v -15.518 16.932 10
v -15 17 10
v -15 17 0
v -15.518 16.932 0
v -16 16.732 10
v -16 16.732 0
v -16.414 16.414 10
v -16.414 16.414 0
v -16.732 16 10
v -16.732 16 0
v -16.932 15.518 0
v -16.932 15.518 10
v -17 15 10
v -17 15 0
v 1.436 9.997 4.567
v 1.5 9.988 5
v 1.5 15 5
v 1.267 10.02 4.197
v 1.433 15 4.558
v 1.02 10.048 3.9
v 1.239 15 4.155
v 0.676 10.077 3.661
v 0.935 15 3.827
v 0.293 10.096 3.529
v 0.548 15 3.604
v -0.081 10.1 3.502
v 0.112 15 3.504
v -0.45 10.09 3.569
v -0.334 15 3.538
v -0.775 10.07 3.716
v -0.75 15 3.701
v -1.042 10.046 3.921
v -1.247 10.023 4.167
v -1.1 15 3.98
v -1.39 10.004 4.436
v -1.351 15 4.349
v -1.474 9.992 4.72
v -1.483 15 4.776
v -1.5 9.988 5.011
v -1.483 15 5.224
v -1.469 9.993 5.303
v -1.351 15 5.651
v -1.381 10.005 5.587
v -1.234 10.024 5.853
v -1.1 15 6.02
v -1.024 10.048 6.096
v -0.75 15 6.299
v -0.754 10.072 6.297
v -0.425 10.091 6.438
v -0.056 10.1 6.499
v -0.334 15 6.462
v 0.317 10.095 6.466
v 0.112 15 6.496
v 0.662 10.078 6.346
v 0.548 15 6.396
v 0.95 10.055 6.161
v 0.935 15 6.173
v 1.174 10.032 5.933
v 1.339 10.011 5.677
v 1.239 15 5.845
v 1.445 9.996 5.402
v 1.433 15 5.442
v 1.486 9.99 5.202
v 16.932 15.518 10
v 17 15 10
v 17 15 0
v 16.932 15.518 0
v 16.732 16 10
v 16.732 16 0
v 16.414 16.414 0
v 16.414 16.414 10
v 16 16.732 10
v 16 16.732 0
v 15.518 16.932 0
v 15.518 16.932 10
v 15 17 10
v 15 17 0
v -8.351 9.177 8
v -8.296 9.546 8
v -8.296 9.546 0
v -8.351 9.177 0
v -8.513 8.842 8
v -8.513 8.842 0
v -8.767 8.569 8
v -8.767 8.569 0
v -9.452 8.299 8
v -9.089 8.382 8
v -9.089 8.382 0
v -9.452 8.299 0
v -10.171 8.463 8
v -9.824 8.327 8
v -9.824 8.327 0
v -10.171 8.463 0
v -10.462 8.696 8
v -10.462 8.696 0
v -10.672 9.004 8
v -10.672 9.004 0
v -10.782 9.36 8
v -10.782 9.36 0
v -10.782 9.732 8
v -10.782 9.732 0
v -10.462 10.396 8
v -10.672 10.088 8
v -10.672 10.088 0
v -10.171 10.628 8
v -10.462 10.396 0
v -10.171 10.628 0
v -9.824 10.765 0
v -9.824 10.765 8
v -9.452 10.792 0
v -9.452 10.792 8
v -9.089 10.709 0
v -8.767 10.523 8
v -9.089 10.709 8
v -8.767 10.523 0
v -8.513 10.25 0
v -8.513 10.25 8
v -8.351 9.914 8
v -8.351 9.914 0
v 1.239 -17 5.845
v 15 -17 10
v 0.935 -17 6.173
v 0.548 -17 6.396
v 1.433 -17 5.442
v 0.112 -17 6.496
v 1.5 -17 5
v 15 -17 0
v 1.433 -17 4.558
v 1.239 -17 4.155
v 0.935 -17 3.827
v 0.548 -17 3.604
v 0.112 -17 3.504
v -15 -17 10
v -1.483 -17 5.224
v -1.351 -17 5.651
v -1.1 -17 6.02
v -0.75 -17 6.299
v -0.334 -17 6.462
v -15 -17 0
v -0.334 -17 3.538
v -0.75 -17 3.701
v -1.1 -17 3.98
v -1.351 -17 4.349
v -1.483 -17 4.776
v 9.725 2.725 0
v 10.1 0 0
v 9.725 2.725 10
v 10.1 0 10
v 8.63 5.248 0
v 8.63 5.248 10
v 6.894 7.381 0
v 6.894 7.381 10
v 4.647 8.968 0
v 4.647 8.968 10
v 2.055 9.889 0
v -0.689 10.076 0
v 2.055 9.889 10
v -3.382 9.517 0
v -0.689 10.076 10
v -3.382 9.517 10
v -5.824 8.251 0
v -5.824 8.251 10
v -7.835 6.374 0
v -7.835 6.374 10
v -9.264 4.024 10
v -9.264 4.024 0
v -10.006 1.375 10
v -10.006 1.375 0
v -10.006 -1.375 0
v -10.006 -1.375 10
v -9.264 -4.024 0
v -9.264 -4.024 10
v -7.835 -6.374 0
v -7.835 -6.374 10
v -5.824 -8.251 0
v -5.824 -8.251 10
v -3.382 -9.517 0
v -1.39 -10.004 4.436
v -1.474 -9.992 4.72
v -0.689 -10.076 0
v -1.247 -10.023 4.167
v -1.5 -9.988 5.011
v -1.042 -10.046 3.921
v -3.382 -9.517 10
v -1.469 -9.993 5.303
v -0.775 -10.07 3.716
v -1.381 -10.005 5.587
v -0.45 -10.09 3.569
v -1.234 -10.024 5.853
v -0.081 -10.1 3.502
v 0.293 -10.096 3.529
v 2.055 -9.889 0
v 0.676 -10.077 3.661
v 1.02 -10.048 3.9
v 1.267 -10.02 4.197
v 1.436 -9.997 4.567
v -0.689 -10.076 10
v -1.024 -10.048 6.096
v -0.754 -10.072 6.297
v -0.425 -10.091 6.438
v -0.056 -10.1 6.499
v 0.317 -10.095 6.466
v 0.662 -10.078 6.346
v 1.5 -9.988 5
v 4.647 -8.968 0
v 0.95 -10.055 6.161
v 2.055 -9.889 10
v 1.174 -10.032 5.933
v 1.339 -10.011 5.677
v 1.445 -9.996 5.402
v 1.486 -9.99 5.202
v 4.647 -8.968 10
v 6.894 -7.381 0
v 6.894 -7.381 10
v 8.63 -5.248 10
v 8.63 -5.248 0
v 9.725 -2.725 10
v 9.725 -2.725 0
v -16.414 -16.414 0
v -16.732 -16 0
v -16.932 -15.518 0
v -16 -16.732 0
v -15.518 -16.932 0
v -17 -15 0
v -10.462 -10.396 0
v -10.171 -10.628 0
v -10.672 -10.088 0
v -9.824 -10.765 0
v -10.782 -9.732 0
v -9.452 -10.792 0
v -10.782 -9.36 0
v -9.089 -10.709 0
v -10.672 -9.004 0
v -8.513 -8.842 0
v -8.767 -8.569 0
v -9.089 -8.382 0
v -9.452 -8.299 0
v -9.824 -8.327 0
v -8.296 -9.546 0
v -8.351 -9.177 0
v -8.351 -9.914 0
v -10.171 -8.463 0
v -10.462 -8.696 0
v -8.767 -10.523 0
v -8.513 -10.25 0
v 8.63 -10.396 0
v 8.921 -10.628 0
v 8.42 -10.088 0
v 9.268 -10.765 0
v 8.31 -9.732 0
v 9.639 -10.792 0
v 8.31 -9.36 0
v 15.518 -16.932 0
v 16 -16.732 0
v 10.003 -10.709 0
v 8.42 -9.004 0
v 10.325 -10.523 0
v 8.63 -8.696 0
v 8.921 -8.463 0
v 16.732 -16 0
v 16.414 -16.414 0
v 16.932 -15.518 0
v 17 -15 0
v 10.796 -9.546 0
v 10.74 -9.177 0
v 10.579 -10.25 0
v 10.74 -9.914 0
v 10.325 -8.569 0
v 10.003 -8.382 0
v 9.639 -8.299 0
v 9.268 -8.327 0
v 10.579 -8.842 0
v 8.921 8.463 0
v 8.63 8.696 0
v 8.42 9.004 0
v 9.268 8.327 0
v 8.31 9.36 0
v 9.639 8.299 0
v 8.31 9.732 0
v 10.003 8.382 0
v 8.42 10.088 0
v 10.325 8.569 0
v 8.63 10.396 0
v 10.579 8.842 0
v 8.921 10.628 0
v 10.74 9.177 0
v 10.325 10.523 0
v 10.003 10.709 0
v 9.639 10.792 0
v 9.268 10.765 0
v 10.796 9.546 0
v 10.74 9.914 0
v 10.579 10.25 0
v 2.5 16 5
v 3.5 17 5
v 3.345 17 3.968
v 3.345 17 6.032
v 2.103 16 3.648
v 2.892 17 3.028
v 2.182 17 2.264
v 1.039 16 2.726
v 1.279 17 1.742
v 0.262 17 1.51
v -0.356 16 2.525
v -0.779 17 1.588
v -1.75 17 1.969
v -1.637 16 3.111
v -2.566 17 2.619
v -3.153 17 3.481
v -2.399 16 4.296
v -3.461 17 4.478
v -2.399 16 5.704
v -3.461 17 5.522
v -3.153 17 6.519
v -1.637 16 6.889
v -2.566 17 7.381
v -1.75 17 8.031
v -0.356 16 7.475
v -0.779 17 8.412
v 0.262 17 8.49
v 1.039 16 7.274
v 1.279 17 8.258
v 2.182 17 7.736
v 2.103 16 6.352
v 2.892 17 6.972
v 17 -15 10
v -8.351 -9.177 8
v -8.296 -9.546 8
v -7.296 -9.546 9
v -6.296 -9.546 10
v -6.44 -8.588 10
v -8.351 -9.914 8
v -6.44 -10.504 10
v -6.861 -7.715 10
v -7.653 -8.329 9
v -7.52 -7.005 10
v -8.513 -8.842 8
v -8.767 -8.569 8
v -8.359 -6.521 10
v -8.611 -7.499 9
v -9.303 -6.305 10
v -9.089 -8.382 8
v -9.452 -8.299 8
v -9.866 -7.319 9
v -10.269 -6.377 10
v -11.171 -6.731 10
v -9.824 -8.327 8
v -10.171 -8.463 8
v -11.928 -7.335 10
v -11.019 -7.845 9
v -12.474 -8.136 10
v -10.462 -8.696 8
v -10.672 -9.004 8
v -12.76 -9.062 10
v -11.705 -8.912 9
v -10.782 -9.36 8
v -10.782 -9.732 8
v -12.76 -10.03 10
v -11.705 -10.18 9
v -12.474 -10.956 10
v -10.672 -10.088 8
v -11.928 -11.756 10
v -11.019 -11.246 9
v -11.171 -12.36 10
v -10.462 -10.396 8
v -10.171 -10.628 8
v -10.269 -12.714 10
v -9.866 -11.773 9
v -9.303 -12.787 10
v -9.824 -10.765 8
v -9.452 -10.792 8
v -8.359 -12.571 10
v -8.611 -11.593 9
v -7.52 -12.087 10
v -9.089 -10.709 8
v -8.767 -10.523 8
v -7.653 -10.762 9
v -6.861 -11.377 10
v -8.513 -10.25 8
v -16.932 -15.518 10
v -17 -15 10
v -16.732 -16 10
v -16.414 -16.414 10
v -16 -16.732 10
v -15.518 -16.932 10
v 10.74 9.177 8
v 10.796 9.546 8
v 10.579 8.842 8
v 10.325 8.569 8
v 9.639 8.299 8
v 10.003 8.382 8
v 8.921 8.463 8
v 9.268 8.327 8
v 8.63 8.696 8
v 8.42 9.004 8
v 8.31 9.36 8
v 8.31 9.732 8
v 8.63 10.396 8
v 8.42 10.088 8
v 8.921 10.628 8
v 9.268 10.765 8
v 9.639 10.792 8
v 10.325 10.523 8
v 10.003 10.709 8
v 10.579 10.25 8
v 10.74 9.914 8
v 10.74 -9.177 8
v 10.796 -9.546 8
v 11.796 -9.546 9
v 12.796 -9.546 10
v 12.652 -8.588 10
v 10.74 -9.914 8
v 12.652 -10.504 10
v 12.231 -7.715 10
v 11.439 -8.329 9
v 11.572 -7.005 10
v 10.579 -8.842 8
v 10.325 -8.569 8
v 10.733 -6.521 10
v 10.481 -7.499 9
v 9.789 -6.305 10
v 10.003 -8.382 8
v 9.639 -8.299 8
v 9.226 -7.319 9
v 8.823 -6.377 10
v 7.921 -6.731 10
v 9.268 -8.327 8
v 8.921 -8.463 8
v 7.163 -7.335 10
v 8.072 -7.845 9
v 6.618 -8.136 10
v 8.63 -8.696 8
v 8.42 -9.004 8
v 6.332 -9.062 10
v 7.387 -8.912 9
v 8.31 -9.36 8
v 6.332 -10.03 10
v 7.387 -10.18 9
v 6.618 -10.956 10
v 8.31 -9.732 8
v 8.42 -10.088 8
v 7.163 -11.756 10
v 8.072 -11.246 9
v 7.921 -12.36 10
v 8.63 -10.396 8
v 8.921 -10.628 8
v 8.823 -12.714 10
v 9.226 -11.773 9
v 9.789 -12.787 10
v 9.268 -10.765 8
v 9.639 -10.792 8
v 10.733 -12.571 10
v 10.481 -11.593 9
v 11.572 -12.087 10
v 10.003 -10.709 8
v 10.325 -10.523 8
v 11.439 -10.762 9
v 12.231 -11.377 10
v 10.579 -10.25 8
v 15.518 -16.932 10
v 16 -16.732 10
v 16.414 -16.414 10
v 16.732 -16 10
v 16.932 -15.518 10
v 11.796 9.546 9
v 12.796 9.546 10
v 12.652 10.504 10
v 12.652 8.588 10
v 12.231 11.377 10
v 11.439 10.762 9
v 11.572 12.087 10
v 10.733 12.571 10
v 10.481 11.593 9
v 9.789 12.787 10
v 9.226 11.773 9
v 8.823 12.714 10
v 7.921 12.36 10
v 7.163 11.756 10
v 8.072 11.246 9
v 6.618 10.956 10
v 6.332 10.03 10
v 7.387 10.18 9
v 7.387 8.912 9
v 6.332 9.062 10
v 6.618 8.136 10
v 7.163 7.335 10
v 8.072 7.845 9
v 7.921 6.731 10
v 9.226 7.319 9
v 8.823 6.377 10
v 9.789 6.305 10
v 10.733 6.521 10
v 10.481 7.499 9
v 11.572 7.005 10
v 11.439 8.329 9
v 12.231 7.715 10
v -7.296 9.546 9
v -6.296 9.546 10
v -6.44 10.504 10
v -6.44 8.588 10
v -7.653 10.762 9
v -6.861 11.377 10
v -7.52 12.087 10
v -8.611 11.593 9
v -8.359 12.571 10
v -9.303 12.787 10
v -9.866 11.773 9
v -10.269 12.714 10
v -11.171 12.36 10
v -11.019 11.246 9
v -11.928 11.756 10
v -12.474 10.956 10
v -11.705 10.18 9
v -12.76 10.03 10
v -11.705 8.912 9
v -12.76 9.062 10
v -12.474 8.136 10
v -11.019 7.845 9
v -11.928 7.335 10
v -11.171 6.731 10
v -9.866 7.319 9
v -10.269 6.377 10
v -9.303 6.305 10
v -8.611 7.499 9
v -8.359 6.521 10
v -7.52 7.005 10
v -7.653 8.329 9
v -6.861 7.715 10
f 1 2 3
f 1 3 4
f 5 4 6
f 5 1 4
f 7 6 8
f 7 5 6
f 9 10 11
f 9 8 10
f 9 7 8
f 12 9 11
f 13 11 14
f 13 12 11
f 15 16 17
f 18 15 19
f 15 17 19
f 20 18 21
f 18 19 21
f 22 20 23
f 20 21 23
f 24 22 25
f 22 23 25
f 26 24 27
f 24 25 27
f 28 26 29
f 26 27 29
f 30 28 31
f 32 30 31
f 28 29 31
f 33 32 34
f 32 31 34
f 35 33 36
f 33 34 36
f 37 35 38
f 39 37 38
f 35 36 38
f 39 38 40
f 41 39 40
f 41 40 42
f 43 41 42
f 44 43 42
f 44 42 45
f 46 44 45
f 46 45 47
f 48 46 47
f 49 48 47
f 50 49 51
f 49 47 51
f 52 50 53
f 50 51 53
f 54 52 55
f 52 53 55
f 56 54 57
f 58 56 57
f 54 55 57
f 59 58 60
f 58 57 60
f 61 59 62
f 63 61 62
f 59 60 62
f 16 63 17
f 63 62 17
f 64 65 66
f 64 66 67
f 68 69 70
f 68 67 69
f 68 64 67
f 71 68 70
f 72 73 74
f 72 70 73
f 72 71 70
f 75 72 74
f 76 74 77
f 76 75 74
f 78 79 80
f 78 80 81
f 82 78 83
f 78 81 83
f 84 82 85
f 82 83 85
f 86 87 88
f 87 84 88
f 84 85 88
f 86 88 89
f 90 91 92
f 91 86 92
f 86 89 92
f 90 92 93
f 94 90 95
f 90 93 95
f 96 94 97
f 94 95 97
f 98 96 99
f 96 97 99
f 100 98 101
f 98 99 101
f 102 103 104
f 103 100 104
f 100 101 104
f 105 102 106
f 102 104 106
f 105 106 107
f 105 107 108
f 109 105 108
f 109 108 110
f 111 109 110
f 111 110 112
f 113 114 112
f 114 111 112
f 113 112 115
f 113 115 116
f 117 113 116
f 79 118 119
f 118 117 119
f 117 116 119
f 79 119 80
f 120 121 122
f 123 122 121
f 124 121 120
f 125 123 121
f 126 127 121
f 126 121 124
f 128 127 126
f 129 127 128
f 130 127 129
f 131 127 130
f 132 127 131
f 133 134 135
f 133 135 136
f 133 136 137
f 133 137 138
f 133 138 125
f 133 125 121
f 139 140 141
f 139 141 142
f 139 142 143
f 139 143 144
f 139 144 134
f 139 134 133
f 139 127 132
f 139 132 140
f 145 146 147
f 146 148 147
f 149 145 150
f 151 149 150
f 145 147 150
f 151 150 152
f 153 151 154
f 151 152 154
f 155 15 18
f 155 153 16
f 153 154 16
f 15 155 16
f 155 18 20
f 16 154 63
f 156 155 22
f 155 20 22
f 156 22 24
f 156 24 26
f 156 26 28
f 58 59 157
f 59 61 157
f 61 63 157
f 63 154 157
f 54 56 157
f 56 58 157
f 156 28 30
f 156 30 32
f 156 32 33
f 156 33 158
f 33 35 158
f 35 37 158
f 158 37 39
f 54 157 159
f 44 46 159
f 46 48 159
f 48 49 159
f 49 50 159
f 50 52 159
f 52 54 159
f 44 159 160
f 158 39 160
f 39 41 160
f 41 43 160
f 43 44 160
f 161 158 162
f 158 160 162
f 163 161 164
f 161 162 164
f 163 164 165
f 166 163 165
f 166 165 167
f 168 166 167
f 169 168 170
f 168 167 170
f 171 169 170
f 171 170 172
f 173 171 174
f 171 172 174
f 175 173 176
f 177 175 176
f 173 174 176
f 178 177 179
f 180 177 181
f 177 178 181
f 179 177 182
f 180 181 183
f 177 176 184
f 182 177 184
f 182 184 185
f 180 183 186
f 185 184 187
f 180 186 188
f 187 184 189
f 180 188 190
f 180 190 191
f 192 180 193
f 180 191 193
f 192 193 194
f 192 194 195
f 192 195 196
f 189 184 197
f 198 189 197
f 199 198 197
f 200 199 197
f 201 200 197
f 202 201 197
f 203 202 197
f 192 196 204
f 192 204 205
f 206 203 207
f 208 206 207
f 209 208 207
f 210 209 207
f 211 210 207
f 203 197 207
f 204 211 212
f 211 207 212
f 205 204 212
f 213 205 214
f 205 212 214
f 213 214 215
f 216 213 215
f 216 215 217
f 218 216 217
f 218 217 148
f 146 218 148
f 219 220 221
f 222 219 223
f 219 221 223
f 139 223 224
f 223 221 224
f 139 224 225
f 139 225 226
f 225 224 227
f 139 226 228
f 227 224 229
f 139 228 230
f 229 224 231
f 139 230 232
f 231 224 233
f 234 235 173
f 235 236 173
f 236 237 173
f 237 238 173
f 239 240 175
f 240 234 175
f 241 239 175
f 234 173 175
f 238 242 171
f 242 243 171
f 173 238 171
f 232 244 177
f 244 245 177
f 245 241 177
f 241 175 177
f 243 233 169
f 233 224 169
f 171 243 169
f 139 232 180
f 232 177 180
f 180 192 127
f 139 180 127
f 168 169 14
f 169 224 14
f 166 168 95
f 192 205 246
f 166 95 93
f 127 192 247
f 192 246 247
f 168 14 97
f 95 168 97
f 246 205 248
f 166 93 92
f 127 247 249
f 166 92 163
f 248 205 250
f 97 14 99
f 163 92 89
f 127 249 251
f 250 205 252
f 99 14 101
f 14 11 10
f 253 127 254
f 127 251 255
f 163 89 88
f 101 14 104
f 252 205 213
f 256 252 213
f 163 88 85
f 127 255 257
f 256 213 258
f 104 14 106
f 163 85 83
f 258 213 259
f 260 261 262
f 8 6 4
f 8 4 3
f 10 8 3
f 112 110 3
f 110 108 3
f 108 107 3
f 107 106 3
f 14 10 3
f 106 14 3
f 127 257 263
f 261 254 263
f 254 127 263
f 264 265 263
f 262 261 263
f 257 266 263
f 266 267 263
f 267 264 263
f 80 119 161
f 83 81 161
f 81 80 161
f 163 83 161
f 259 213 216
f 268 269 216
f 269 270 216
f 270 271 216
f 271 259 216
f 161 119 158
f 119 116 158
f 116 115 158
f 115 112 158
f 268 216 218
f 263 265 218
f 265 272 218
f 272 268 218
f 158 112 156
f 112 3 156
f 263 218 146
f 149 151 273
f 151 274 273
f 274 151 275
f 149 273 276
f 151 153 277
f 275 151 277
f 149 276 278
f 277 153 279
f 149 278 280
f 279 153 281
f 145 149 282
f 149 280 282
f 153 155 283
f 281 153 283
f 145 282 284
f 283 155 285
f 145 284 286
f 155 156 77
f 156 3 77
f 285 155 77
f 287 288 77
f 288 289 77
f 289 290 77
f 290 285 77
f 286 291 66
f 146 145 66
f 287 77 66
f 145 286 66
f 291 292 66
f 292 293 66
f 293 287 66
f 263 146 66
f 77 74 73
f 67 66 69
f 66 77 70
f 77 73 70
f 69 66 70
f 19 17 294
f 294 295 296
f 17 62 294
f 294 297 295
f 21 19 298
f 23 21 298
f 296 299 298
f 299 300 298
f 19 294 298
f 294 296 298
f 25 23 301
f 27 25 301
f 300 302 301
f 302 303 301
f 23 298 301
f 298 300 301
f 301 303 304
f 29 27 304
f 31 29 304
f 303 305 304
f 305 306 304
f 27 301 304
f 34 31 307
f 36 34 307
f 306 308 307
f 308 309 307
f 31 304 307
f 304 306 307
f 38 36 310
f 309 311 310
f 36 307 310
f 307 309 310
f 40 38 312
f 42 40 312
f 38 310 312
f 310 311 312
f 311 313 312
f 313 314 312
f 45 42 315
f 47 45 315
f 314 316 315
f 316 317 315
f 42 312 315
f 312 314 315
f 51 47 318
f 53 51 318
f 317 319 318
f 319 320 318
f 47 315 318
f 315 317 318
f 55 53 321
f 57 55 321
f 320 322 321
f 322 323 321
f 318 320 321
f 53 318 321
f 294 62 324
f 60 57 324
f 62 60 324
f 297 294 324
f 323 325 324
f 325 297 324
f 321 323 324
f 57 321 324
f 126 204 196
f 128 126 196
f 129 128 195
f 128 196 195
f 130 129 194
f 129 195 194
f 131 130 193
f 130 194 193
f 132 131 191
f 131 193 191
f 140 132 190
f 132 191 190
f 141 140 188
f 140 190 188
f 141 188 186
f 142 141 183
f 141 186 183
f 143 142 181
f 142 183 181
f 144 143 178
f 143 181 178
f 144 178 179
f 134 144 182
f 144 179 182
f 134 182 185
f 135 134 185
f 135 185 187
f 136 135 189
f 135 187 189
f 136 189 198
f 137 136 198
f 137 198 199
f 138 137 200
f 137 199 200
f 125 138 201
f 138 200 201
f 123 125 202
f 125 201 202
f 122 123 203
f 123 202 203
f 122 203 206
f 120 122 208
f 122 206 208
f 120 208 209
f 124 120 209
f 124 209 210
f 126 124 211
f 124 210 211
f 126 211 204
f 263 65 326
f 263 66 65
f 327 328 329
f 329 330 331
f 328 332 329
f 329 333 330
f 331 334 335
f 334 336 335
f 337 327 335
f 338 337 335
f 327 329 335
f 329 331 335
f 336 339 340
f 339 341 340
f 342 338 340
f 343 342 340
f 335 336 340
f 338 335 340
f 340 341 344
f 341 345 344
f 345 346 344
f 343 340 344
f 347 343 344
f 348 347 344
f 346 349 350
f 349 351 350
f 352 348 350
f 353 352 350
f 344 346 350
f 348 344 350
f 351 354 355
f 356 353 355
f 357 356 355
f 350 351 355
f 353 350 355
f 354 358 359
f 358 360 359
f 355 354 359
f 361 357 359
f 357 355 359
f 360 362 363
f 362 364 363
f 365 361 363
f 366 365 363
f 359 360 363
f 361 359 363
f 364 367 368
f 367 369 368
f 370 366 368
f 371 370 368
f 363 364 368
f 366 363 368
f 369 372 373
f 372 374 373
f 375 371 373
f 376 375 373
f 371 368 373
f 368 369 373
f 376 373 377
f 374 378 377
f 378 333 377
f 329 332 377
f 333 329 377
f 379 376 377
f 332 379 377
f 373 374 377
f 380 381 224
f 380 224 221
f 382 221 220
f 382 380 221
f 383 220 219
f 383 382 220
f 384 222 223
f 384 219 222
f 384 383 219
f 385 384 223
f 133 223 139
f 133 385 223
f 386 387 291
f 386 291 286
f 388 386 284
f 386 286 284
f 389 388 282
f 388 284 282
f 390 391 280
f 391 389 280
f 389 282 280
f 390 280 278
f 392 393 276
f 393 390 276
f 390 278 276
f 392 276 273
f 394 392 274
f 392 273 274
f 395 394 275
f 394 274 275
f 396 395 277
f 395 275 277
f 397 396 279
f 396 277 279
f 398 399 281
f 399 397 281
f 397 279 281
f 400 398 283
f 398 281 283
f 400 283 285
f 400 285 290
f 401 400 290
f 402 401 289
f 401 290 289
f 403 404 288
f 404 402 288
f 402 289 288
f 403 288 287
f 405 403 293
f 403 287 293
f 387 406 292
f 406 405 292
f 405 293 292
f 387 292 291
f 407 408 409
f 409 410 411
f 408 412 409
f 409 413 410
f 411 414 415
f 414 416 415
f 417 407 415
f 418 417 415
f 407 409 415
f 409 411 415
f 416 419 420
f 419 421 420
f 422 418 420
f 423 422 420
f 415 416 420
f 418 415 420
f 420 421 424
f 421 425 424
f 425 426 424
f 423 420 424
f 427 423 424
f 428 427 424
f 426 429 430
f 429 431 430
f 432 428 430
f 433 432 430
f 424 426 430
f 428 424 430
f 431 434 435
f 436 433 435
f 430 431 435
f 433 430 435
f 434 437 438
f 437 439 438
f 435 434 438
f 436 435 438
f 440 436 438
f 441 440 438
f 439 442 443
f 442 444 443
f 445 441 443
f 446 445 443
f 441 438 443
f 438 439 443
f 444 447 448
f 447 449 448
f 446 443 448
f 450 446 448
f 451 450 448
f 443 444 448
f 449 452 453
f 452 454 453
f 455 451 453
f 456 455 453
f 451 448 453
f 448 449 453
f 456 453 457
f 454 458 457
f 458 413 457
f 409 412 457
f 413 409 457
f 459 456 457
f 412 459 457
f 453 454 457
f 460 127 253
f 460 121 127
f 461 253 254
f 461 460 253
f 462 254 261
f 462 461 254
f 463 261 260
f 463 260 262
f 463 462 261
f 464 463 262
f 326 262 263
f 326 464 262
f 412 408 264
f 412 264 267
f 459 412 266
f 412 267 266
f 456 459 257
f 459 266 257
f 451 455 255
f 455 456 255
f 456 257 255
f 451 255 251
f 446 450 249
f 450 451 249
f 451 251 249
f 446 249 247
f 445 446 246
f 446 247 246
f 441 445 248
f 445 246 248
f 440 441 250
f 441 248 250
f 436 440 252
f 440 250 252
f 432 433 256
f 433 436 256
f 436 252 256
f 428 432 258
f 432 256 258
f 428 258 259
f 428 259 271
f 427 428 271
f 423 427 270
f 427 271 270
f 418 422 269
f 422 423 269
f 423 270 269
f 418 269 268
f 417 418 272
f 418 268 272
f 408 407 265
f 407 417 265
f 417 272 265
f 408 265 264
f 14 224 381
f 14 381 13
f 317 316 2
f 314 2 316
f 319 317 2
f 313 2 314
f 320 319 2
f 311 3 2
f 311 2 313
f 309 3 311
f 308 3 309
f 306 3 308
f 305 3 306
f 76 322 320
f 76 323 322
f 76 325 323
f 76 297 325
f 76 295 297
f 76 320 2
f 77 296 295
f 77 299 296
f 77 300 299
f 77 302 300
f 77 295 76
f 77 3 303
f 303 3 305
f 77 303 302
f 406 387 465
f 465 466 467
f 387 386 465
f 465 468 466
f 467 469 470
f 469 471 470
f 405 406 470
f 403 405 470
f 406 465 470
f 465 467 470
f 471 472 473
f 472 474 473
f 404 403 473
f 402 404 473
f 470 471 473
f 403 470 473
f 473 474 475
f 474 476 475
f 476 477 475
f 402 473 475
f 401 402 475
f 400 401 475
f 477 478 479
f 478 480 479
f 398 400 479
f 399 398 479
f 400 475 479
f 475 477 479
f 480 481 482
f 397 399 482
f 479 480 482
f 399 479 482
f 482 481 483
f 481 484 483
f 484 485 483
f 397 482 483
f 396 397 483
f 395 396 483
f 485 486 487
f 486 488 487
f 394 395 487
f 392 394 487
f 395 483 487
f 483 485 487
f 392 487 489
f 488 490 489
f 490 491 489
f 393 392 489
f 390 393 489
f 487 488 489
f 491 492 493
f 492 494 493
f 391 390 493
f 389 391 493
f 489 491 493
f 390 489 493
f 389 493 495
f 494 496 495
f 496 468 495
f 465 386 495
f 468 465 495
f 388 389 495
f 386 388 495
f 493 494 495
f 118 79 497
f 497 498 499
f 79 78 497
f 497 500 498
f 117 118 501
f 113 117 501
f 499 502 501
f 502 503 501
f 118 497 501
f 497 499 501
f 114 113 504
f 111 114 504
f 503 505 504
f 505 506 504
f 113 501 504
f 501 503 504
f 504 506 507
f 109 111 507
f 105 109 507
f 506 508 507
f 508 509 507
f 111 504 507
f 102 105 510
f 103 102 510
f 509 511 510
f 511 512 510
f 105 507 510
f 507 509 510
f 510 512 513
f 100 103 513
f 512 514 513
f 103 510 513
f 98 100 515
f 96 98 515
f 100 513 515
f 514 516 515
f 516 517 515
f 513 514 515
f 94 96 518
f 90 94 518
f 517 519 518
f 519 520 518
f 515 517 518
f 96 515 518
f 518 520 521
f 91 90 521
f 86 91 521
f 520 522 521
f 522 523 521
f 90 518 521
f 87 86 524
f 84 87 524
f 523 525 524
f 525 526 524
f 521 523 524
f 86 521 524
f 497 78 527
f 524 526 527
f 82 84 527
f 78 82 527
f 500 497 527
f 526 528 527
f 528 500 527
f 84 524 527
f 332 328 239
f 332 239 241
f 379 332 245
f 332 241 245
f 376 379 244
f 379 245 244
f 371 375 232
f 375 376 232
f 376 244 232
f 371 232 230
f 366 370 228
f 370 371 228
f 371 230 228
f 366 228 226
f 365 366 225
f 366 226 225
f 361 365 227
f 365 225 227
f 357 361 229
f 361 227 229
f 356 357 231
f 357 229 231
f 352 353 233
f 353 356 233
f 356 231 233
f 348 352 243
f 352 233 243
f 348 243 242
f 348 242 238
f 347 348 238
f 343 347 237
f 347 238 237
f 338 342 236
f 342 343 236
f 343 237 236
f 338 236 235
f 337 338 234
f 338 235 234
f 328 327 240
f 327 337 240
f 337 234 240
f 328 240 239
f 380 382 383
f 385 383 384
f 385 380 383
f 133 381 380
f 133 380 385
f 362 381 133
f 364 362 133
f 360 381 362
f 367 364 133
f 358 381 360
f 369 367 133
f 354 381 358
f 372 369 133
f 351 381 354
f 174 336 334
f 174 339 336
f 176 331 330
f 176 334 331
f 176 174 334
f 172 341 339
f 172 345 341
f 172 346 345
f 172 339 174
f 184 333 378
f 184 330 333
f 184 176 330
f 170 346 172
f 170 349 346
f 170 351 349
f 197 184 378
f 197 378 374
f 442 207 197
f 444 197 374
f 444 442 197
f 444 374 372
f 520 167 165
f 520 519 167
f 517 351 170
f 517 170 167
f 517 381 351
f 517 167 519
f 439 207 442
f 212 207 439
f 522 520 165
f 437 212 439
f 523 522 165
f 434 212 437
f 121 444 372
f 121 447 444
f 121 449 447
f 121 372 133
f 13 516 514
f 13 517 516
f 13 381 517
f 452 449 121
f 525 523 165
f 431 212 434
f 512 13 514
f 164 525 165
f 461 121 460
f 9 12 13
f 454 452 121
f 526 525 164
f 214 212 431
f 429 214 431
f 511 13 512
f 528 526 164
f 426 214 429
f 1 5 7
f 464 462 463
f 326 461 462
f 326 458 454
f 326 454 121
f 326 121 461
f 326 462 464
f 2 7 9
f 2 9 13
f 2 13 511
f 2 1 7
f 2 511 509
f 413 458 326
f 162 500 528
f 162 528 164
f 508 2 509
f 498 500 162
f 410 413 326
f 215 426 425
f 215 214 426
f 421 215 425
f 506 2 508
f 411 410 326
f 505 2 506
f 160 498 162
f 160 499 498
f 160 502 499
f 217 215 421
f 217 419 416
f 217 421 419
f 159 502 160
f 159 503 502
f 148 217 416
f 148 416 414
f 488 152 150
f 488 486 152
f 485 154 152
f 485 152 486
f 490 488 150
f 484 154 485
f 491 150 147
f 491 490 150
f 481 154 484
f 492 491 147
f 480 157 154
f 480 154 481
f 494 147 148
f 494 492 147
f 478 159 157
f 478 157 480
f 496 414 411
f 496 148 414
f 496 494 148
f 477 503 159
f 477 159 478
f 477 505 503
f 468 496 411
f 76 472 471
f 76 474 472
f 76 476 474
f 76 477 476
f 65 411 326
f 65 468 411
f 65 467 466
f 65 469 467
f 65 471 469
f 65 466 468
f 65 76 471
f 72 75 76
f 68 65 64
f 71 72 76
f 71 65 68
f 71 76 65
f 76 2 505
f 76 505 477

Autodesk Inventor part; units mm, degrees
ref_plane "YZ Plane" through (0, 0, 0) normal (1, 0, 0) x (0, 1, 0)
ref_plane "XZ Plane" through (0, 0, 0) normal (0, 1, 0) x (-1, 0, 0)
ref_plane "XY Plane" through (0, 0, 0) normal (0, 0, 1) x (1, 0, 0)
sketch "Эскиз1" plane through (0, 0, 0) normal (0, 0, 1) x (1, 0, 0)
  circle A0 centre (0, 0) radius 13.5 construction
  circle A1 centre (-9.5459, 9.5459) radius 1.25
  line L0 (-9.5459, 9.5459) -> (0, 0) construction
  line L1 (0, 0) -> (2.2284, 0) construction
  circle A2 centre (-9.5459, -9.5459) radius 1.25
  circle A3 centre (9.5459, -9.5459) radius 1.25
  circle A4 centre (9.5459, 9.5459) radius 1.25
  line L2 (17, -17) -> (-17, -17)
  line L3 (-17, -17) -> (-17, 17)
  line L4 (-17, 17) -> (17, 17)
  line L5 (17, 17) -> (17, -17)
  line L6 (17, -17) -> (-17, 17) construction
  line L7 (-17, -17) -> (17, 17) construction
  dimension "d0" = 27
  dimension "d1" = 2.5
  dimension "d3" = 45
  dimension "d6" = 360
  dimension "d8" = 34
  dimension "d9" = 34
extrude "Выдавливание1" add sketch "Эскиз1" along normal blind 10
fillet "Сопряжение1" radius 2 4 edges at (17, 17, 5) (-17, 17, 5) (-17, -17, 5) (17, -17, 5)
sketch "Эскиз2" plane through (-15, 17, 0) normal (0, 1, 0) x (1, 0, 0)
  circle A0 centre (15, -5) radius 1.5
  line L0 (-2, 0) -> (-2, -10) projected
  line L1 (0, 0) -> (30, 0) projected
  point P0 (15, 0)
  point P1 (-2, -5)
  point P2 (15, 0)
  dimension "d16" = 3
sketch "Эскиз3" plane through (0, 0, 10) normal (0, 0, 1) x (1, 0, 0)
  circle A0 centre (0, 0) radius 10.1
  dimension "d13" = 20.2
extrude "Выдавливание2" cut sketch "Эскиз3" against normal blind 10
extrude "Выдавливание3" cut sketch "Эскиз2" against normal blind 40.5
chamfer "Фаска1" distance 2 angle 45 5 edges at (-10.7959, 9.5459, 10) (8.2959, 9.5459, 10) (8.2959, -9.5459, 10) (-10.7959, -9.5459, 10) (-1.5, 17, 5)
properties part number "крепление трубы"
